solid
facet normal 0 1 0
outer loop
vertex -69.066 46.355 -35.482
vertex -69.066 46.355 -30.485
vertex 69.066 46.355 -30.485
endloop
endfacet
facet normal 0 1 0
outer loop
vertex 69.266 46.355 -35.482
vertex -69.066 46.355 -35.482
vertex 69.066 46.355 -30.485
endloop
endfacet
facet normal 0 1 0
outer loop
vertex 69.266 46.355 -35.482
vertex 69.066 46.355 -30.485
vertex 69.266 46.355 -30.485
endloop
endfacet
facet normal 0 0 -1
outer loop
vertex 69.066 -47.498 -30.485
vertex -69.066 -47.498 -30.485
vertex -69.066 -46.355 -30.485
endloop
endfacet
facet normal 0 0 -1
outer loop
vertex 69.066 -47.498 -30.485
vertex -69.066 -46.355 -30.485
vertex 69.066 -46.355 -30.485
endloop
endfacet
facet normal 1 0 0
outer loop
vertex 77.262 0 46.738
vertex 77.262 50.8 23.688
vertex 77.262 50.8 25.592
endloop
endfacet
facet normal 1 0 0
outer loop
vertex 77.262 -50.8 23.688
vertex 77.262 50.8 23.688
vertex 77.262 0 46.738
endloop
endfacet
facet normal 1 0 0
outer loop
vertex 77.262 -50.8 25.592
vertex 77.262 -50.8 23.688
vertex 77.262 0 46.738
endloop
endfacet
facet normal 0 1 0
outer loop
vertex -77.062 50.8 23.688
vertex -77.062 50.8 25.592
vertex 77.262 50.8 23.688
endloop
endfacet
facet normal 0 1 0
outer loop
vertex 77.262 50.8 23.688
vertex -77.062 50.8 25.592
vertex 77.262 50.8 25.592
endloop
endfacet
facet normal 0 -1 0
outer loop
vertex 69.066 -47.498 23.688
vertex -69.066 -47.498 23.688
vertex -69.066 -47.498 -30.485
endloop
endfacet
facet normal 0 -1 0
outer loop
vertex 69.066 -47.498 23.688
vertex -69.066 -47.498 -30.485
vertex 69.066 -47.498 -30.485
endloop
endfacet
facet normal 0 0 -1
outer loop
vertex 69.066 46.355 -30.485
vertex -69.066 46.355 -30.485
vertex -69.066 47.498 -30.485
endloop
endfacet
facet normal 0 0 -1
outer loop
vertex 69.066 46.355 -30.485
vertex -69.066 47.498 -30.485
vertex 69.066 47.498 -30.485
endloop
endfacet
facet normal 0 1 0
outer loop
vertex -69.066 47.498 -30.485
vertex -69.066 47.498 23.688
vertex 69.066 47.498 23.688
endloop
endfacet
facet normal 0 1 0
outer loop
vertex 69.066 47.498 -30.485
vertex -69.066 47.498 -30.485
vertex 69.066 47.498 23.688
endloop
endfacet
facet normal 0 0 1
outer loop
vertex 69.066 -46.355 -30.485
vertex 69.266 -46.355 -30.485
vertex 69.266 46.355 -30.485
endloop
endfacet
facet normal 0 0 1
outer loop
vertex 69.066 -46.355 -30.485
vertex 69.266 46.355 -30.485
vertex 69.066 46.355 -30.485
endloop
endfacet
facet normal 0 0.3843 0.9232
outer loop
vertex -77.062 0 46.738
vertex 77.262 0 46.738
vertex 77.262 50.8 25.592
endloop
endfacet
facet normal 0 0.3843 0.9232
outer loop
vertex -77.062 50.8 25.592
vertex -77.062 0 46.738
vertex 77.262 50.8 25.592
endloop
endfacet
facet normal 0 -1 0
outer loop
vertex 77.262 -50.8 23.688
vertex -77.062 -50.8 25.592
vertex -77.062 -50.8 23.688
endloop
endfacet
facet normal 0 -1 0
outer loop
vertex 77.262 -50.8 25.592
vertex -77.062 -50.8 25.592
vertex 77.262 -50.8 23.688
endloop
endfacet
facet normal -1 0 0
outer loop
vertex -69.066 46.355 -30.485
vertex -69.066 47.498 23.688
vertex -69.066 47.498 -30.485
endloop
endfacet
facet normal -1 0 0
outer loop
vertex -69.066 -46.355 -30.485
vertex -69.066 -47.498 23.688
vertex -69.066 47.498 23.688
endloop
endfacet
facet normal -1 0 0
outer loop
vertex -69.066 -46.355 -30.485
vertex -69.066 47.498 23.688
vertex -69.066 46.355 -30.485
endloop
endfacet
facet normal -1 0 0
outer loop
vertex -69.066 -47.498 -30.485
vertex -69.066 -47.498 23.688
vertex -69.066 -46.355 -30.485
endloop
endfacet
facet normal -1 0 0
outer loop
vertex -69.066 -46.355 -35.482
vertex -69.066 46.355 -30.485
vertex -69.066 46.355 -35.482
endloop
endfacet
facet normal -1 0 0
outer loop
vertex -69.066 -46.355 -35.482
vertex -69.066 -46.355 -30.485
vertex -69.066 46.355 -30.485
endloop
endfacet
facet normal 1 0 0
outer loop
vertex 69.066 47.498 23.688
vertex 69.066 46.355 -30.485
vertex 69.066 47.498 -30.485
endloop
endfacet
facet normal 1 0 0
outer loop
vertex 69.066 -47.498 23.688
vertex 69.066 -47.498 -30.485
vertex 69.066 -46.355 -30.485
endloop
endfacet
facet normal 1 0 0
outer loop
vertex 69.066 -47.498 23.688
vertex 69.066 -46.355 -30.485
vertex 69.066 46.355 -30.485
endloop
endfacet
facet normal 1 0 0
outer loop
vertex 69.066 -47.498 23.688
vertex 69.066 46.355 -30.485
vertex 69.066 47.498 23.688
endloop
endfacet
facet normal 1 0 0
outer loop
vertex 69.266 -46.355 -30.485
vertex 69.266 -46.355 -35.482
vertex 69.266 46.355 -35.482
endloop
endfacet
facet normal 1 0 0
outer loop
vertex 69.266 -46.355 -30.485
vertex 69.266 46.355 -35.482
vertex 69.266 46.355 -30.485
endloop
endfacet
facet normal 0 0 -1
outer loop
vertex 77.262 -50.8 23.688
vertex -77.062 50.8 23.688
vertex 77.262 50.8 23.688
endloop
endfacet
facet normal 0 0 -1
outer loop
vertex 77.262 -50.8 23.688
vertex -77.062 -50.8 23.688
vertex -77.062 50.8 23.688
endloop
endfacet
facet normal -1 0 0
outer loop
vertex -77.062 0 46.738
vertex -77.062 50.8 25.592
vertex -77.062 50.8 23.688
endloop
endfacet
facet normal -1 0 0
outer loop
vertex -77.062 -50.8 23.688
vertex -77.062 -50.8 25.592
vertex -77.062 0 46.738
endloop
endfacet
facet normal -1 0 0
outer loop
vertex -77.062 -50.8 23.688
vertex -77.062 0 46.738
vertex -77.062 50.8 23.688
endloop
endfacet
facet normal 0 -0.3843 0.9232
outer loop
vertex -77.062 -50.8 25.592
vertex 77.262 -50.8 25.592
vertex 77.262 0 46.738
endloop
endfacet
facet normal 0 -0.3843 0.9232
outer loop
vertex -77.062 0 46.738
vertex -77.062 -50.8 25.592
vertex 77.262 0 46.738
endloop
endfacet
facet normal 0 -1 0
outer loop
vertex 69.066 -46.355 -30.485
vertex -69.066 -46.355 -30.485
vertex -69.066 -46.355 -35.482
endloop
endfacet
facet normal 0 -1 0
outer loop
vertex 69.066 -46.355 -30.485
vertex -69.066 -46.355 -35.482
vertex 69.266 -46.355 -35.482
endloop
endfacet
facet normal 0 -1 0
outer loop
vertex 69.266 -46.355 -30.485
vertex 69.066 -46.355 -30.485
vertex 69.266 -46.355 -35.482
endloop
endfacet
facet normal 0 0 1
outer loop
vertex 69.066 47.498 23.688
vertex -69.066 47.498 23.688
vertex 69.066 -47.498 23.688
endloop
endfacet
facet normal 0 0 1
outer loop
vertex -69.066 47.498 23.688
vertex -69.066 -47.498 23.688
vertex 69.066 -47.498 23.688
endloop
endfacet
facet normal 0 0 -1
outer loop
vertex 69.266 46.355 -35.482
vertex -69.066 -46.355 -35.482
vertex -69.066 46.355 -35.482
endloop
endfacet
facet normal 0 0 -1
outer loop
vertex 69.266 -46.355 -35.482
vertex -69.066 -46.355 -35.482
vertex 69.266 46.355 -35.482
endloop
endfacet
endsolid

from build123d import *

# Parameters (mm, degrees)
F0_W        = 138.1315141916
F0_H        = 54.1731398553
F1_DEPTH    = 47.498
F0_H_2      = 6.7966300994
F2_DEPTH    = 50.8
F3_T1_DEPTH = 534.0028075166
F4_DEPTH    = 46.355


# Not quite as in the source:
# - a fillet or chamfer that OpenCascade refuses, or shapes differently, is made with other operations: its cross-section is extruded or revolved along the edge and cut away or added


with BuildPart() as f1:
    # F0 (on Front) → F1 (new body, symmetric)
    with BuildSketch(Plane.XZ):
        with Locations((0, -3.3983150497)):
            Rectangle(F0_W, F0_H)
    extrude(amount=F1_DEPTH, both=True)

    # F0 (on Front) → F4 (join, symmetric)
    with BuildSketch(Plane.XZ):
        Polygon((69.0657570958, -30.4848849773), (-69.0657570958, -30.4848849773), (-69.0657570958, -35.4824028909), (69.2656487226, -35.4824028909), (69.2656487226, -30.4848849773), align=None)
    extrude(amount=F4_DEPTH, both=True)


with BuildPart() as f2:
    # F0 (on Front) → F2 (new body, symmetric)
    with BuildSketch(Plane.XZ):
        with Locations((0, 27.0865699276)):
            Rectangle(F0_W, F0_H_2)
        Polygon((-69.0657570958, 23.6882548779), (-69.0657570958, 30.4848849773), (69.0657570958, 30.4848849773), (69.0657570958, 23.6882548779), (77.2616863251, 23.6882548779), (77.2616863251, 56.0721941292), (-77.0617872477, 56.0721941292), (-77.0617872477, 23.6882548779), align=None)
    extrude(amount=F2_DEPTH, both=True)

    # F3: chamfer of 30.48 x 73.2234970305 on 2 edges, made by hand

    # F3_s2 → F3_t1 (cut)
    with BuildSketch(Plane.YZ.offset(-266.9014542196)):
        Polygon((-22.4234970305, 56.0721941292), (50.8, 25.5921941292), (50.8, 56.0721941292), align=None)
        Polygon((-50.8, 25.5921941292), (22.4234970305, 56.0721941292), (-50.8, 56.0721941292), align=None)
    extrude(amount=F3_T1_DEPTH, mode=Mode.SUBTRACT)


solid = Compound([f1.part, f2.part])
